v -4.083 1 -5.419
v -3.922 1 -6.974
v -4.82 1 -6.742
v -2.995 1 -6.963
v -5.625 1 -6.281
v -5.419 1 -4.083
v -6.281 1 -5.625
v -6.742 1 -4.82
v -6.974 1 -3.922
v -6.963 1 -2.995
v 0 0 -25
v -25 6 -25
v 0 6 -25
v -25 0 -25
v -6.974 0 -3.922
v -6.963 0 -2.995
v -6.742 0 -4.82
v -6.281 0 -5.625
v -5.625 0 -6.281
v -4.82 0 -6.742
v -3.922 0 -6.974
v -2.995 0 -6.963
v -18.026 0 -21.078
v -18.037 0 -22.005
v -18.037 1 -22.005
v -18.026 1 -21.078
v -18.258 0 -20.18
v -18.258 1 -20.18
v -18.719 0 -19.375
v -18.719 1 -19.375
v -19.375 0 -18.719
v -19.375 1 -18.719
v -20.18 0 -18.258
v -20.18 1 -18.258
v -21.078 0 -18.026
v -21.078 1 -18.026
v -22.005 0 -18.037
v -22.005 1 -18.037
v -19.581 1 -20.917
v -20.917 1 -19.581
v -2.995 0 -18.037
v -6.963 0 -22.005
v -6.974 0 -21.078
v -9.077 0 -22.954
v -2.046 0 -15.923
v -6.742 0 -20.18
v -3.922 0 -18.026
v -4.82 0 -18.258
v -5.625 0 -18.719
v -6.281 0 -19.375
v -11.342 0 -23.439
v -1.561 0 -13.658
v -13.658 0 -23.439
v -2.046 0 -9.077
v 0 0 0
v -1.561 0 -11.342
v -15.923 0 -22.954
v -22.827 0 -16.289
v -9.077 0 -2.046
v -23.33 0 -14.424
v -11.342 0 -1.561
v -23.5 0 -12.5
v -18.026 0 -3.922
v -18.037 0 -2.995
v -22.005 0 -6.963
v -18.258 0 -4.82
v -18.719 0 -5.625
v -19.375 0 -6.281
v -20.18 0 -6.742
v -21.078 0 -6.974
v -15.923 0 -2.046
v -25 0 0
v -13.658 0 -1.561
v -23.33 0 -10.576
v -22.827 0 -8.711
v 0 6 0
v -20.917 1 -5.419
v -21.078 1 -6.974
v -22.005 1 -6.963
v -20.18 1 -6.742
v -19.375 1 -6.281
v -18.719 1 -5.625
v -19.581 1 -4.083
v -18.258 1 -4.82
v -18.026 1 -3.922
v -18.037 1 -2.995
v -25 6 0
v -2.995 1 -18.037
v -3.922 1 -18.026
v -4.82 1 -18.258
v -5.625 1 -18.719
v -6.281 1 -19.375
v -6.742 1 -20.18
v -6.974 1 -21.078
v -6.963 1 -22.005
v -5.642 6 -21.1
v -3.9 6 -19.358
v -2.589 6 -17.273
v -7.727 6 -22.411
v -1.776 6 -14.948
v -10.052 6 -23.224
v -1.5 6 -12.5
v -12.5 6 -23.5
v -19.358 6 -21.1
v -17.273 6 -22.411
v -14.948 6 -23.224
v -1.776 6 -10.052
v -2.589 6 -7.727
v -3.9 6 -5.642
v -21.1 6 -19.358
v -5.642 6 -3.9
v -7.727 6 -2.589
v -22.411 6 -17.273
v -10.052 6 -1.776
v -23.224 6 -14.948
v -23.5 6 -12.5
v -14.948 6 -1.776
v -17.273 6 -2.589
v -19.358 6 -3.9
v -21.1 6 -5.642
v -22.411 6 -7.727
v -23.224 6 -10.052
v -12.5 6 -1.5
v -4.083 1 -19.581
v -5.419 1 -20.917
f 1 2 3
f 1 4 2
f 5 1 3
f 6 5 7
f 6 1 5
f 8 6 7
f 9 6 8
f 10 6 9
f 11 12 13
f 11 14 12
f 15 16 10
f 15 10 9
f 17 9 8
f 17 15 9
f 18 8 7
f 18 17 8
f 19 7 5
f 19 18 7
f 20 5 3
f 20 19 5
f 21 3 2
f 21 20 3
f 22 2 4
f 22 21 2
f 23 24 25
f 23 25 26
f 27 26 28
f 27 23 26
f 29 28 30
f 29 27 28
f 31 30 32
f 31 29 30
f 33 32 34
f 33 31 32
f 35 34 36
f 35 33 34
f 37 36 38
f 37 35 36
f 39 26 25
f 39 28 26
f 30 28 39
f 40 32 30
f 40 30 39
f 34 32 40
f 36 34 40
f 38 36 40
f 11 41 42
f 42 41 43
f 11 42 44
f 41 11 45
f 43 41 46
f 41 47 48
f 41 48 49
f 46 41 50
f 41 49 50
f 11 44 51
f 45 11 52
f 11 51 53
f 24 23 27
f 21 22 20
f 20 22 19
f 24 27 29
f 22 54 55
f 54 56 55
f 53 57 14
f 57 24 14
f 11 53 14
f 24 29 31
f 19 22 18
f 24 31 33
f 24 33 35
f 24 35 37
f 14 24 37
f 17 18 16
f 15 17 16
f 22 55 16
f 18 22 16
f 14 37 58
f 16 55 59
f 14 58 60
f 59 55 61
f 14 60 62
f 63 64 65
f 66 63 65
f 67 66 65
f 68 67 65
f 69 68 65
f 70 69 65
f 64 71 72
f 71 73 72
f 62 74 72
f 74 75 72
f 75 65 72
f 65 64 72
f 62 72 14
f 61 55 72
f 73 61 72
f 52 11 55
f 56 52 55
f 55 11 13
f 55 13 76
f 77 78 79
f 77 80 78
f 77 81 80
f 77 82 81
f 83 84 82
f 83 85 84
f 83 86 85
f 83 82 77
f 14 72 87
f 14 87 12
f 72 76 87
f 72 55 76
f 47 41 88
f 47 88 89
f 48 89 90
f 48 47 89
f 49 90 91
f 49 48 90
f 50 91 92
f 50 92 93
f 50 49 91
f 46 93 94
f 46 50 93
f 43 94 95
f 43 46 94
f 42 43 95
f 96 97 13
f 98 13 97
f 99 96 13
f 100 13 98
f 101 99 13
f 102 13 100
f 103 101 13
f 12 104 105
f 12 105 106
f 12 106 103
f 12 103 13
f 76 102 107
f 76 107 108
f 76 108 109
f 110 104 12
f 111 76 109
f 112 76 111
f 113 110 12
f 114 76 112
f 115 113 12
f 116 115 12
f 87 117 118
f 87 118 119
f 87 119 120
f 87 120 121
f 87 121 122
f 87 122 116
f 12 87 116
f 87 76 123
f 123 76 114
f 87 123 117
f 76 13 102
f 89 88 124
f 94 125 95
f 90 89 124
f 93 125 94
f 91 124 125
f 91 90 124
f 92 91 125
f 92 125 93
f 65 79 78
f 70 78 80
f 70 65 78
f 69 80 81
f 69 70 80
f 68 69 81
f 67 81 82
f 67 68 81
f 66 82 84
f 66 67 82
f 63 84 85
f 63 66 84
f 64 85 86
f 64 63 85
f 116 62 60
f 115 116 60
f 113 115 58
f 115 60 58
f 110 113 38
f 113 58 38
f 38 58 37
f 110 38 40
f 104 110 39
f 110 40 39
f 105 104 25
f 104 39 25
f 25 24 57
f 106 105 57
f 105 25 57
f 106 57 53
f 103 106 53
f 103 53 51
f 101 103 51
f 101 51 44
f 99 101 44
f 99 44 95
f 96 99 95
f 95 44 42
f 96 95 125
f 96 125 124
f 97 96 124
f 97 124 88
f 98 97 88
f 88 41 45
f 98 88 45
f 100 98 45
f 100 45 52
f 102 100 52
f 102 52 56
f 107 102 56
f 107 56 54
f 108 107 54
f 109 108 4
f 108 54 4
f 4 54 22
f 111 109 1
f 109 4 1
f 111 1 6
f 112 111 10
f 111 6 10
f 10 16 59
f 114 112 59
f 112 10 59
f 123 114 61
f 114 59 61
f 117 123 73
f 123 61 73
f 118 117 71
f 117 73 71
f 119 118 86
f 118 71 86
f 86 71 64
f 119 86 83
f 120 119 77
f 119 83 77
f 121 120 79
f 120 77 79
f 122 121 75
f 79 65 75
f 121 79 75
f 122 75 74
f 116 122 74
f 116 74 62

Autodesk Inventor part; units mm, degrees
ref_plane "YZ Plane" through (0, 0, 0) normal (1, 0, 0) x (0, 1, 0)
ref_plane "XZ Plane" through (0, 0, 0) normal (0, 1, 0) x (-1, 0, 0)
ref_plane "XY Plane" through (0, 0, 0) normal (0, 0, 1) x (1, 0, 0)
sketch "Sketch1" plane through (0, 0, 0) normal (0, 1, 0) x (-1, 0, 0)
  line L0 (0, 0) -> (25, 0)
  line L1 (25, 0) -> (25, -25)
  line L2 (25, -25) -> (0, -25)
  line L3 (0, -25) -> (0, 0)
  circle A0 centre (12.5, -12.5) radius 11
  circle A1 centre (3.5, -3.5) radius 3.5
  circle A2 centre (3.5, -21.5) radius 3.5
  circle A3 centre (21.5, -21.5) radius 3.5
  circle A4 centre (21.5, -3.5) radius 3.5
  line L4 (25, -12.5) -> (0, -12.5) construction
  line L5 (12.5, -25) -> (12.5, 0) construction
  point P0 (6.9634, -2.995)
  point P1 (2.995, -6.9634)
  point P2 (18.0366, -2.995)
  point P3 (22.005, -6.9634)
  point P4 (6.9634, -22.005)
  point P5 (2.995, -18.0366)
  point P6 (22.005, -18.0366)
  point P7 (18.0366, -22.005)
  point P8 (0, -3.5)
  point P9 (3.5, 0)
  point P10 (25, -3.5)
  point P11 (21.5, 0)
  point P12 (0, -21.5)
  point P13 (3.5, -25)
  point P14 (21.5, -25)
  point P15 (25, -21.5)
  dimension "cellRadius" = 22
  dimension "catcherRadius" = 7
  dimension "d27" = 7
  dimension "d28" = 7
  dimension "d29" = 7
  dimension "d36" = 25
  dimension "d37" = 25
extrude "thickness" add sketch "Sketch1" along normal blind 6 contours L0 A1 L3 | L0 A4 A0 A1 | A1 A0 | A1 A0 A2 L3 | L0 L1 A4 | A4 A0 | A2 L2 L3 | A2 A0 | L1 A3 A0 A4 | A2 A0 A3 L2 | A3 A0 | L1 L2 A3 picked at (3.6063, -3.4216) picked at (21.3937, -3.4216) picked at (3.4216, -21.3937) picked at (21.3937, -21.5784)
extrude "catcher" add sketch "Sketch1" along normal blind 1 contours L0 A1 L3 | A1 A0 | L0 L1 A4 | A4 A0 | A1 A0 | A2 L2 L3 | A2 A0 | A0 A4 | A2 A0 | A3 A0 | L1 L2 A3 | A0 A3
equation "\"d27\" = catcherRadius"
equation "\"d28\" = catcherRadius"
equation "\"d29\" = catcherRadius"
equation "\"d36\" = width"
equation "\"d37\" = width"
equation "\"catcherHeight\" = 0.166667 * spacerHeight"
equation "\"width\" = 25"
equation "\"spacerHeight\" = 6"
properties part number "spacers_base"
